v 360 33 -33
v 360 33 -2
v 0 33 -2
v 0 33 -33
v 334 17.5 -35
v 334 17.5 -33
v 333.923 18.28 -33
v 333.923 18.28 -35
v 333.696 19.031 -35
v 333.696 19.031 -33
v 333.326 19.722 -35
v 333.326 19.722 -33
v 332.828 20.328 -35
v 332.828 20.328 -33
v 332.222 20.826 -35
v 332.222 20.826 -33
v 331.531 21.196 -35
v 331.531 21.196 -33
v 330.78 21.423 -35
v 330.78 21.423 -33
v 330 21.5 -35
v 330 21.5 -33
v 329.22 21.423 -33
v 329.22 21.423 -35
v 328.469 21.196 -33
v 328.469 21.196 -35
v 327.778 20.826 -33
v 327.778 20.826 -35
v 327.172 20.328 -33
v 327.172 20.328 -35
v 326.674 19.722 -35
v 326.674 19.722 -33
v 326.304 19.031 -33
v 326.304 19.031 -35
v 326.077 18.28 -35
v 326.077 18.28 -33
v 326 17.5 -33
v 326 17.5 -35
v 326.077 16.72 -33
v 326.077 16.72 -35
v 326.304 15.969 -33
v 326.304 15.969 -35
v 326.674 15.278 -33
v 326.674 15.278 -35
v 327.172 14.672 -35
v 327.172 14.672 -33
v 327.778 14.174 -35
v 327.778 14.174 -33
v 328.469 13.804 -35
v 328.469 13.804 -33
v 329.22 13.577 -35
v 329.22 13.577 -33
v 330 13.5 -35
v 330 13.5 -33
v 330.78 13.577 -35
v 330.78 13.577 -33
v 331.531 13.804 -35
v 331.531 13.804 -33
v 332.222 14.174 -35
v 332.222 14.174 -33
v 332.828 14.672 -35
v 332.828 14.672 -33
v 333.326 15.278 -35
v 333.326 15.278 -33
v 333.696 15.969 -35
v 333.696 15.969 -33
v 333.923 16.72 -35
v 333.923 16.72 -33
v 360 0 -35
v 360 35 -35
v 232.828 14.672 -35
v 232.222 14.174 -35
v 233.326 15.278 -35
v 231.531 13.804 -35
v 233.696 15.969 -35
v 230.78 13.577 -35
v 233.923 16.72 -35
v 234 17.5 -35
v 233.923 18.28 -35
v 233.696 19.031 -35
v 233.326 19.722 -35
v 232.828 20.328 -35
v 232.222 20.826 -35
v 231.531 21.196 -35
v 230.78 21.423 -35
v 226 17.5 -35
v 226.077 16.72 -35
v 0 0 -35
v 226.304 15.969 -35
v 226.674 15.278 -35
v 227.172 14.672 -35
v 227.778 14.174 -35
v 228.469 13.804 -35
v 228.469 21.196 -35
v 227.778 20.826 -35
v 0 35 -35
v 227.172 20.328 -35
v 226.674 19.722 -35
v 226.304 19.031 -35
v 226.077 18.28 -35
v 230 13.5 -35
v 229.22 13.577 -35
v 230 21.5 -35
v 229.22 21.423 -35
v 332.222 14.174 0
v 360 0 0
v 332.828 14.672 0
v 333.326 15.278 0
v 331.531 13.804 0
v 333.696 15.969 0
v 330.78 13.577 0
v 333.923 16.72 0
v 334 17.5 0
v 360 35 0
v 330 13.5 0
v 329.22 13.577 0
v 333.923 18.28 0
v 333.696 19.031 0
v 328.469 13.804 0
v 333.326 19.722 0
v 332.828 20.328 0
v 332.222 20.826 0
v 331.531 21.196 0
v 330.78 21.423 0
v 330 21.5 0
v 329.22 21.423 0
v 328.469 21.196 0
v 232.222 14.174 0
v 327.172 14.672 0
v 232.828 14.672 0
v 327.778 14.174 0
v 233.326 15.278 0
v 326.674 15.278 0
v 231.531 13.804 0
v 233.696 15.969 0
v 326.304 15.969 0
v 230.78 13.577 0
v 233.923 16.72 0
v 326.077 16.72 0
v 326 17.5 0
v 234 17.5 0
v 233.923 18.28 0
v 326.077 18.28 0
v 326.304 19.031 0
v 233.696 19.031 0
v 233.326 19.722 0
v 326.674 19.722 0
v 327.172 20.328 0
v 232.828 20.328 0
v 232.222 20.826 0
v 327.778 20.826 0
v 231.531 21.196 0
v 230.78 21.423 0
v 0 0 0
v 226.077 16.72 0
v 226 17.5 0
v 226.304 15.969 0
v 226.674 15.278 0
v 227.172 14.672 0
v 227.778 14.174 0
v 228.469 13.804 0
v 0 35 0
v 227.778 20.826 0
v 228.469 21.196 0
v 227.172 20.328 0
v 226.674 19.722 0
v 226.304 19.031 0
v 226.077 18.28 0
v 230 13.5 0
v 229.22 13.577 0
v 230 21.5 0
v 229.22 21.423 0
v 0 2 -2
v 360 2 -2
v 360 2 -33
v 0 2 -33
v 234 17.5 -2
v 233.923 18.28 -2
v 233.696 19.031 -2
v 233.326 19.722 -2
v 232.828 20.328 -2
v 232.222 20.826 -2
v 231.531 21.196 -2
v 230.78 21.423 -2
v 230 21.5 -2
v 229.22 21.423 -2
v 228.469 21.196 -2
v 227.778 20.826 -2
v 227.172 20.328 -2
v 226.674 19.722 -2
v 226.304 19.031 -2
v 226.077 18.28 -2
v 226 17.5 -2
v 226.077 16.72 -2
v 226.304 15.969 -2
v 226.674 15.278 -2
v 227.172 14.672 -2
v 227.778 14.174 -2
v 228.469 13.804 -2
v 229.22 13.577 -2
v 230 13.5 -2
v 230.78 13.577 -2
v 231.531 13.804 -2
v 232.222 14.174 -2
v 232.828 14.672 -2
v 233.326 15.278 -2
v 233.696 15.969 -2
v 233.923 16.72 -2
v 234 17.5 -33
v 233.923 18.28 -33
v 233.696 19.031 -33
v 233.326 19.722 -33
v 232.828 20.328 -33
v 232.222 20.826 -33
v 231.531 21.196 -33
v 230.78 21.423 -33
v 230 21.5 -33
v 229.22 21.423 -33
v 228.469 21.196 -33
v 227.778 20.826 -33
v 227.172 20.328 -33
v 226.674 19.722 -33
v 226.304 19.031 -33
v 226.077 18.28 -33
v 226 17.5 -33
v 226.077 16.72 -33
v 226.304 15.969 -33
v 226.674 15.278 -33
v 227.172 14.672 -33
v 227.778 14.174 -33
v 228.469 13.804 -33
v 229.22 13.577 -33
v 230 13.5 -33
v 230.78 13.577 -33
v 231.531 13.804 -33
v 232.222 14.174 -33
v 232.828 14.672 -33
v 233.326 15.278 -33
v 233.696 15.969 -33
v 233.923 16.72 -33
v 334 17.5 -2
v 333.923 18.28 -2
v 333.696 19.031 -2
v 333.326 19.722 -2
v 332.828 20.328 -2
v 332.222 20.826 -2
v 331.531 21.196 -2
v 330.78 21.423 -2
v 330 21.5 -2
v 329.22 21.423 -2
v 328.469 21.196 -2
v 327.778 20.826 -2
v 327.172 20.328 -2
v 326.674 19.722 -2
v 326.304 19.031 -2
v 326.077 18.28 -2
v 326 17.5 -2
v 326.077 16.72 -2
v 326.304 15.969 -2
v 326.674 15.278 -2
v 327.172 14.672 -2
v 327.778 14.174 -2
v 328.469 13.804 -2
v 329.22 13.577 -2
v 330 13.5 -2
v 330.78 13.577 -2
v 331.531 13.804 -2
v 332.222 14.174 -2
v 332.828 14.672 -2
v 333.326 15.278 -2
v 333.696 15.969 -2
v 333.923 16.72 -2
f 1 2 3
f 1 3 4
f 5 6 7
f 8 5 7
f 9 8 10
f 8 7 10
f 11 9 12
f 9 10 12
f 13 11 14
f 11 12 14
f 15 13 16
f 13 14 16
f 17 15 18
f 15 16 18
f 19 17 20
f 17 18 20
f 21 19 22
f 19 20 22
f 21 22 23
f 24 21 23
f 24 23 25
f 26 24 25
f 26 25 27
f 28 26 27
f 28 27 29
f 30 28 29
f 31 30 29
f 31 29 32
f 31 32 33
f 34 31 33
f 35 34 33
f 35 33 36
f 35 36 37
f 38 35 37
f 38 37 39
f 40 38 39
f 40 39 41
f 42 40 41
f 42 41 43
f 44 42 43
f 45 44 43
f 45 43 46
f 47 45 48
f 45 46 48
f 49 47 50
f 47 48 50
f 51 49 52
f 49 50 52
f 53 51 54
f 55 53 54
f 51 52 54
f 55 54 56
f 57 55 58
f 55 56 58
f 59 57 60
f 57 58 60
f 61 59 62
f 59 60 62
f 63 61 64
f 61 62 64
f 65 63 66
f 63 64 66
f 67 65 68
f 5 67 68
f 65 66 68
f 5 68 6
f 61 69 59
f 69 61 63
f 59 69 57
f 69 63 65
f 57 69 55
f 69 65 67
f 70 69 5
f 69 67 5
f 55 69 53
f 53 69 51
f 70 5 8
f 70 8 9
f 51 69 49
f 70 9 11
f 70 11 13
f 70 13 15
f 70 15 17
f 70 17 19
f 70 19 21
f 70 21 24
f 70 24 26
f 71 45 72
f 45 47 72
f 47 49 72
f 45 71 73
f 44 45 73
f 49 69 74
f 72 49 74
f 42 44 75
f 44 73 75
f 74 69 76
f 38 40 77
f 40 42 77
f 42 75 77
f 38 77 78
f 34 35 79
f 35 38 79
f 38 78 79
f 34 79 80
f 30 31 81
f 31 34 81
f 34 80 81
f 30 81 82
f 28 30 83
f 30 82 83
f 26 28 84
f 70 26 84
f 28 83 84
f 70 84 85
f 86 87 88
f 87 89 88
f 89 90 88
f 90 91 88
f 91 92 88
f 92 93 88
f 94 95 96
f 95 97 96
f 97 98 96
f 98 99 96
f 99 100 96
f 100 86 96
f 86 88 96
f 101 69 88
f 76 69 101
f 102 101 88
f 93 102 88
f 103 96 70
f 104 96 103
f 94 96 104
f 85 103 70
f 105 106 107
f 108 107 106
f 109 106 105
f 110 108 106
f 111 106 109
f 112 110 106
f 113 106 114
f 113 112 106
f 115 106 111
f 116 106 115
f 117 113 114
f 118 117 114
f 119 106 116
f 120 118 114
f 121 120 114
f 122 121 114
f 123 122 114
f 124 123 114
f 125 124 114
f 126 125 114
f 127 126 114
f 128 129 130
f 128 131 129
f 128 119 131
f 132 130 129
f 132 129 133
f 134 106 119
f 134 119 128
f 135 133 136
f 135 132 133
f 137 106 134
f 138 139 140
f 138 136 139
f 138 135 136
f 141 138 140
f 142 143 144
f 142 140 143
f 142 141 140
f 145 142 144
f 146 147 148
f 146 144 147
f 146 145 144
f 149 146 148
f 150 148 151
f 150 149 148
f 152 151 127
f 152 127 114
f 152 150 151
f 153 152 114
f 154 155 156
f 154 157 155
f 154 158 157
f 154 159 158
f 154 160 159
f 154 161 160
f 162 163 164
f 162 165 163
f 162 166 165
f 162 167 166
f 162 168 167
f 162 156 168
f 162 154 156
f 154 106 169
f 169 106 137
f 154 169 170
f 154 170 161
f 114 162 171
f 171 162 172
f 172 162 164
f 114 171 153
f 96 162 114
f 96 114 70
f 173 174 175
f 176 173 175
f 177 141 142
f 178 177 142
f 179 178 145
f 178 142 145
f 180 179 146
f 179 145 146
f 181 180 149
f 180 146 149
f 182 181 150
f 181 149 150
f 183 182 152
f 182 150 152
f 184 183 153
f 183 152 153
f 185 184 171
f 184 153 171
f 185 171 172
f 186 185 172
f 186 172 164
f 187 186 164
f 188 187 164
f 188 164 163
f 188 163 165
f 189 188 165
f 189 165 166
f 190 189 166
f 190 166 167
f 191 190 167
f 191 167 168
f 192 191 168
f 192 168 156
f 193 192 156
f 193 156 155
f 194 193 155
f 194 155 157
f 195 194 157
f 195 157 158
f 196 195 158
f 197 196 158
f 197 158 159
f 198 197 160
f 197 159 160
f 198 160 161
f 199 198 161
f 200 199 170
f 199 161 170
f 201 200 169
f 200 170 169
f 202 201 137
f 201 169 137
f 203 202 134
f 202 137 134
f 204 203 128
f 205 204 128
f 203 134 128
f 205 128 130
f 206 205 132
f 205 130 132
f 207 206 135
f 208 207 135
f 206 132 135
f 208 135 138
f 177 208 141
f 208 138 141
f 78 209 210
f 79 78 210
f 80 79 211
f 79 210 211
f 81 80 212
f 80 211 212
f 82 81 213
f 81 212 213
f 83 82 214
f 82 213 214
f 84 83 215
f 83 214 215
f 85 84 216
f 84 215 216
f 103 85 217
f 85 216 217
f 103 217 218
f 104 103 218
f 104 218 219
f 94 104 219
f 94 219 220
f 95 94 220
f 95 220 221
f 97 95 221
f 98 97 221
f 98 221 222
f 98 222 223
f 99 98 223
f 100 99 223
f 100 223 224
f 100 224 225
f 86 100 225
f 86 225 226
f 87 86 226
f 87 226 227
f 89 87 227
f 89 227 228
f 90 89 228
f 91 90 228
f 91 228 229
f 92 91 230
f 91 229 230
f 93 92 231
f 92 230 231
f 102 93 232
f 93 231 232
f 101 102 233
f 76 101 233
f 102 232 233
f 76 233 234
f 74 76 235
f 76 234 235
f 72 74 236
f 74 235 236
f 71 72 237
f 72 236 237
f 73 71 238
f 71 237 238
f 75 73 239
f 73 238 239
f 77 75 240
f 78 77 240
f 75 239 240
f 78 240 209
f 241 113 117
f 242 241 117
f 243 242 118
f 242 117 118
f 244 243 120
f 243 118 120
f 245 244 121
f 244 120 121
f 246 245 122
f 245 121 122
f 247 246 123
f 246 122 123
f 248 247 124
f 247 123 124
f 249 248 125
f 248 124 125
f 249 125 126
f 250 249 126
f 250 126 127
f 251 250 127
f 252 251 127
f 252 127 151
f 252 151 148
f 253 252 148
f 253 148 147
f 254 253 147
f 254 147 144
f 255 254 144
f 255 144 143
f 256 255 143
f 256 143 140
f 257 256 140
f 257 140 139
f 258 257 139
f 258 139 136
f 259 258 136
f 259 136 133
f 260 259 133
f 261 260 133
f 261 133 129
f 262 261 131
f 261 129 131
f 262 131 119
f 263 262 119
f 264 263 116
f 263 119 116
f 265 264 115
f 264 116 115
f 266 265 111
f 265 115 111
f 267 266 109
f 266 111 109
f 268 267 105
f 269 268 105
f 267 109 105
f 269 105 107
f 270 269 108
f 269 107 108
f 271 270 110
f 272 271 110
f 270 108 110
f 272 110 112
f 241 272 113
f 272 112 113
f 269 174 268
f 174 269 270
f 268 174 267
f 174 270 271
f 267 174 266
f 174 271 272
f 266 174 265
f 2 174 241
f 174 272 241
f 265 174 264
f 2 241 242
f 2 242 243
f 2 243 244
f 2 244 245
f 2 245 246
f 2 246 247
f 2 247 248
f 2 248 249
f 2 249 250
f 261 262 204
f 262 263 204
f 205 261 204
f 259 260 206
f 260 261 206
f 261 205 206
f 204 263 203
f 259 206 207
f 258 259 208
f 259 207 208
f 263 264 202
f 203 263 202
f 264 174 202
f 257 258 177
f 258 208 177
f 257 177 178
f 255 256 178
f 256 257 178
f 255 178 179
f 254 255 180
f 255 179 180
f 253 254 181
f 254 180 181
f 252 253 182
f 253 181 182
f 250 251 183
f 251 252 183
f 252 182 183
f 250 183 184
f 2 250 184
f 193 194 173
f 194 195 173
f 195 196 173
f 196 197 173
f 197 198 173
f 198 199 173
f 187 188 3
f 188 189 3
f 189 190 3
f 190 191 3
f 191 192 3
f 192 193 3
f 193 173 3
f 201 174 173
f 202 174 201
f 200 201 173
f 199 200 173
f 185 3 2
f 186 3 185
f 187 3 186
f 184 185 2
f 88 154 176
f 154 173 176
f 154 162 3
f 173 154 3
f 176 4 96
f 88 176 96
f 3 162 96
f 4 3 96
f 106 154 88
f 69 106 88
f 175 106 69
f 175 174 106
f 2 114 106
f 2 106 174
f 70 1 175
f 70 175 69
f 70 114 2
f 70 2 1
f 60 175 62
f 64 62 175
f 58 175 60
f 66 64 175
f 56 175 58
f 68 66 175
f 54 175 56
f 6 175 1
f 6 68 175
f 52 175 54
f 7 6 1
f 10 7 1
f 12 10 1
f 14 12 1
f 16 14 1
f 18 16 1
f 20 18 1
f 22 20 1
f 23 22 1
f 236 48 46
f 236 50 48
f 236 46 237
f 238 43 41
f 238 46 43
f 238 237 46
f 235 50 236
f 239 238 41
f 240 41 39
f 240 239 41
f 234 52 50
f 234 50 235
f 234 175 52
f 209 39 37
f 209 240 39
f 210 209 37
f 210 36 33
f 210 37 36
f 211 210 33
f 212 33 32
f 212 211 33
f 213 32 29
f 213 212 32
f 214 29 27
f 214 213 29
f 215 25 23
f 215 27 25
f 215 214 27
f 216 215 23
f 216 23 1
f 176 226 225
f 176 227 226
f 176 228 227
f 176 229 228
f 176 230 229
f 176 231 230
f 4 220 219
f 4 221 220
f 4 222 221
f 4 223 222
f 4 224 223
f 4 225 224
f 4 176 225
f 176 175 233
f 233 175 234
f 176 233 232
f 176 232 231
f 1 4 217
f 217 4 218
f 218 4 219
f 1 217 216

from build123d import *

# Parameters (mm, degrees)
SKETCH1_W           = 35
SKETCH1_H           = 35
SKETCH1_W_2         = 31
SKETCH1_H_2         = 31
BOSS_EXTRUDE1_DEPTH = 360
SKETCH2_R           = 4
CUT_EXTRUDE1_DEPTH  = 364.386846212


with BuildPart() as part:
    # Sketch1 → Boss-Extrude1 (new body)
    with BuildSketch(Plane(origin=(0, 0, 0), x_dir=(0, 0, -1), z_dir=(1, 0, 0))):
        with Locations((17.5, 17.5)):
            Rectangle(SKETCH1_W, SKETCH1_H)
        with Locations((17.5, 17.5)):
            Rectangle(SKETCH1_W_2, SKETCH1_H_2, mode=Mode.SUBTRACT)
    extrude(amount=BOSS_EXTRUDE1_DEPTH)

    # Sketch2 → Cut-Extrude1 (cut, through all)
    with BuildSketch(Plane.XY):
        with Locations((330, 17.5)):
            Circle(SKETCH2_R)
        with Locations((230, 17.5)):
            Circle(SKETCH2_R)
    extrude(amount=-CUT_EXTRUDE1_DEPTH, mode=Mode.SUBTRACT)


solid = part.part
